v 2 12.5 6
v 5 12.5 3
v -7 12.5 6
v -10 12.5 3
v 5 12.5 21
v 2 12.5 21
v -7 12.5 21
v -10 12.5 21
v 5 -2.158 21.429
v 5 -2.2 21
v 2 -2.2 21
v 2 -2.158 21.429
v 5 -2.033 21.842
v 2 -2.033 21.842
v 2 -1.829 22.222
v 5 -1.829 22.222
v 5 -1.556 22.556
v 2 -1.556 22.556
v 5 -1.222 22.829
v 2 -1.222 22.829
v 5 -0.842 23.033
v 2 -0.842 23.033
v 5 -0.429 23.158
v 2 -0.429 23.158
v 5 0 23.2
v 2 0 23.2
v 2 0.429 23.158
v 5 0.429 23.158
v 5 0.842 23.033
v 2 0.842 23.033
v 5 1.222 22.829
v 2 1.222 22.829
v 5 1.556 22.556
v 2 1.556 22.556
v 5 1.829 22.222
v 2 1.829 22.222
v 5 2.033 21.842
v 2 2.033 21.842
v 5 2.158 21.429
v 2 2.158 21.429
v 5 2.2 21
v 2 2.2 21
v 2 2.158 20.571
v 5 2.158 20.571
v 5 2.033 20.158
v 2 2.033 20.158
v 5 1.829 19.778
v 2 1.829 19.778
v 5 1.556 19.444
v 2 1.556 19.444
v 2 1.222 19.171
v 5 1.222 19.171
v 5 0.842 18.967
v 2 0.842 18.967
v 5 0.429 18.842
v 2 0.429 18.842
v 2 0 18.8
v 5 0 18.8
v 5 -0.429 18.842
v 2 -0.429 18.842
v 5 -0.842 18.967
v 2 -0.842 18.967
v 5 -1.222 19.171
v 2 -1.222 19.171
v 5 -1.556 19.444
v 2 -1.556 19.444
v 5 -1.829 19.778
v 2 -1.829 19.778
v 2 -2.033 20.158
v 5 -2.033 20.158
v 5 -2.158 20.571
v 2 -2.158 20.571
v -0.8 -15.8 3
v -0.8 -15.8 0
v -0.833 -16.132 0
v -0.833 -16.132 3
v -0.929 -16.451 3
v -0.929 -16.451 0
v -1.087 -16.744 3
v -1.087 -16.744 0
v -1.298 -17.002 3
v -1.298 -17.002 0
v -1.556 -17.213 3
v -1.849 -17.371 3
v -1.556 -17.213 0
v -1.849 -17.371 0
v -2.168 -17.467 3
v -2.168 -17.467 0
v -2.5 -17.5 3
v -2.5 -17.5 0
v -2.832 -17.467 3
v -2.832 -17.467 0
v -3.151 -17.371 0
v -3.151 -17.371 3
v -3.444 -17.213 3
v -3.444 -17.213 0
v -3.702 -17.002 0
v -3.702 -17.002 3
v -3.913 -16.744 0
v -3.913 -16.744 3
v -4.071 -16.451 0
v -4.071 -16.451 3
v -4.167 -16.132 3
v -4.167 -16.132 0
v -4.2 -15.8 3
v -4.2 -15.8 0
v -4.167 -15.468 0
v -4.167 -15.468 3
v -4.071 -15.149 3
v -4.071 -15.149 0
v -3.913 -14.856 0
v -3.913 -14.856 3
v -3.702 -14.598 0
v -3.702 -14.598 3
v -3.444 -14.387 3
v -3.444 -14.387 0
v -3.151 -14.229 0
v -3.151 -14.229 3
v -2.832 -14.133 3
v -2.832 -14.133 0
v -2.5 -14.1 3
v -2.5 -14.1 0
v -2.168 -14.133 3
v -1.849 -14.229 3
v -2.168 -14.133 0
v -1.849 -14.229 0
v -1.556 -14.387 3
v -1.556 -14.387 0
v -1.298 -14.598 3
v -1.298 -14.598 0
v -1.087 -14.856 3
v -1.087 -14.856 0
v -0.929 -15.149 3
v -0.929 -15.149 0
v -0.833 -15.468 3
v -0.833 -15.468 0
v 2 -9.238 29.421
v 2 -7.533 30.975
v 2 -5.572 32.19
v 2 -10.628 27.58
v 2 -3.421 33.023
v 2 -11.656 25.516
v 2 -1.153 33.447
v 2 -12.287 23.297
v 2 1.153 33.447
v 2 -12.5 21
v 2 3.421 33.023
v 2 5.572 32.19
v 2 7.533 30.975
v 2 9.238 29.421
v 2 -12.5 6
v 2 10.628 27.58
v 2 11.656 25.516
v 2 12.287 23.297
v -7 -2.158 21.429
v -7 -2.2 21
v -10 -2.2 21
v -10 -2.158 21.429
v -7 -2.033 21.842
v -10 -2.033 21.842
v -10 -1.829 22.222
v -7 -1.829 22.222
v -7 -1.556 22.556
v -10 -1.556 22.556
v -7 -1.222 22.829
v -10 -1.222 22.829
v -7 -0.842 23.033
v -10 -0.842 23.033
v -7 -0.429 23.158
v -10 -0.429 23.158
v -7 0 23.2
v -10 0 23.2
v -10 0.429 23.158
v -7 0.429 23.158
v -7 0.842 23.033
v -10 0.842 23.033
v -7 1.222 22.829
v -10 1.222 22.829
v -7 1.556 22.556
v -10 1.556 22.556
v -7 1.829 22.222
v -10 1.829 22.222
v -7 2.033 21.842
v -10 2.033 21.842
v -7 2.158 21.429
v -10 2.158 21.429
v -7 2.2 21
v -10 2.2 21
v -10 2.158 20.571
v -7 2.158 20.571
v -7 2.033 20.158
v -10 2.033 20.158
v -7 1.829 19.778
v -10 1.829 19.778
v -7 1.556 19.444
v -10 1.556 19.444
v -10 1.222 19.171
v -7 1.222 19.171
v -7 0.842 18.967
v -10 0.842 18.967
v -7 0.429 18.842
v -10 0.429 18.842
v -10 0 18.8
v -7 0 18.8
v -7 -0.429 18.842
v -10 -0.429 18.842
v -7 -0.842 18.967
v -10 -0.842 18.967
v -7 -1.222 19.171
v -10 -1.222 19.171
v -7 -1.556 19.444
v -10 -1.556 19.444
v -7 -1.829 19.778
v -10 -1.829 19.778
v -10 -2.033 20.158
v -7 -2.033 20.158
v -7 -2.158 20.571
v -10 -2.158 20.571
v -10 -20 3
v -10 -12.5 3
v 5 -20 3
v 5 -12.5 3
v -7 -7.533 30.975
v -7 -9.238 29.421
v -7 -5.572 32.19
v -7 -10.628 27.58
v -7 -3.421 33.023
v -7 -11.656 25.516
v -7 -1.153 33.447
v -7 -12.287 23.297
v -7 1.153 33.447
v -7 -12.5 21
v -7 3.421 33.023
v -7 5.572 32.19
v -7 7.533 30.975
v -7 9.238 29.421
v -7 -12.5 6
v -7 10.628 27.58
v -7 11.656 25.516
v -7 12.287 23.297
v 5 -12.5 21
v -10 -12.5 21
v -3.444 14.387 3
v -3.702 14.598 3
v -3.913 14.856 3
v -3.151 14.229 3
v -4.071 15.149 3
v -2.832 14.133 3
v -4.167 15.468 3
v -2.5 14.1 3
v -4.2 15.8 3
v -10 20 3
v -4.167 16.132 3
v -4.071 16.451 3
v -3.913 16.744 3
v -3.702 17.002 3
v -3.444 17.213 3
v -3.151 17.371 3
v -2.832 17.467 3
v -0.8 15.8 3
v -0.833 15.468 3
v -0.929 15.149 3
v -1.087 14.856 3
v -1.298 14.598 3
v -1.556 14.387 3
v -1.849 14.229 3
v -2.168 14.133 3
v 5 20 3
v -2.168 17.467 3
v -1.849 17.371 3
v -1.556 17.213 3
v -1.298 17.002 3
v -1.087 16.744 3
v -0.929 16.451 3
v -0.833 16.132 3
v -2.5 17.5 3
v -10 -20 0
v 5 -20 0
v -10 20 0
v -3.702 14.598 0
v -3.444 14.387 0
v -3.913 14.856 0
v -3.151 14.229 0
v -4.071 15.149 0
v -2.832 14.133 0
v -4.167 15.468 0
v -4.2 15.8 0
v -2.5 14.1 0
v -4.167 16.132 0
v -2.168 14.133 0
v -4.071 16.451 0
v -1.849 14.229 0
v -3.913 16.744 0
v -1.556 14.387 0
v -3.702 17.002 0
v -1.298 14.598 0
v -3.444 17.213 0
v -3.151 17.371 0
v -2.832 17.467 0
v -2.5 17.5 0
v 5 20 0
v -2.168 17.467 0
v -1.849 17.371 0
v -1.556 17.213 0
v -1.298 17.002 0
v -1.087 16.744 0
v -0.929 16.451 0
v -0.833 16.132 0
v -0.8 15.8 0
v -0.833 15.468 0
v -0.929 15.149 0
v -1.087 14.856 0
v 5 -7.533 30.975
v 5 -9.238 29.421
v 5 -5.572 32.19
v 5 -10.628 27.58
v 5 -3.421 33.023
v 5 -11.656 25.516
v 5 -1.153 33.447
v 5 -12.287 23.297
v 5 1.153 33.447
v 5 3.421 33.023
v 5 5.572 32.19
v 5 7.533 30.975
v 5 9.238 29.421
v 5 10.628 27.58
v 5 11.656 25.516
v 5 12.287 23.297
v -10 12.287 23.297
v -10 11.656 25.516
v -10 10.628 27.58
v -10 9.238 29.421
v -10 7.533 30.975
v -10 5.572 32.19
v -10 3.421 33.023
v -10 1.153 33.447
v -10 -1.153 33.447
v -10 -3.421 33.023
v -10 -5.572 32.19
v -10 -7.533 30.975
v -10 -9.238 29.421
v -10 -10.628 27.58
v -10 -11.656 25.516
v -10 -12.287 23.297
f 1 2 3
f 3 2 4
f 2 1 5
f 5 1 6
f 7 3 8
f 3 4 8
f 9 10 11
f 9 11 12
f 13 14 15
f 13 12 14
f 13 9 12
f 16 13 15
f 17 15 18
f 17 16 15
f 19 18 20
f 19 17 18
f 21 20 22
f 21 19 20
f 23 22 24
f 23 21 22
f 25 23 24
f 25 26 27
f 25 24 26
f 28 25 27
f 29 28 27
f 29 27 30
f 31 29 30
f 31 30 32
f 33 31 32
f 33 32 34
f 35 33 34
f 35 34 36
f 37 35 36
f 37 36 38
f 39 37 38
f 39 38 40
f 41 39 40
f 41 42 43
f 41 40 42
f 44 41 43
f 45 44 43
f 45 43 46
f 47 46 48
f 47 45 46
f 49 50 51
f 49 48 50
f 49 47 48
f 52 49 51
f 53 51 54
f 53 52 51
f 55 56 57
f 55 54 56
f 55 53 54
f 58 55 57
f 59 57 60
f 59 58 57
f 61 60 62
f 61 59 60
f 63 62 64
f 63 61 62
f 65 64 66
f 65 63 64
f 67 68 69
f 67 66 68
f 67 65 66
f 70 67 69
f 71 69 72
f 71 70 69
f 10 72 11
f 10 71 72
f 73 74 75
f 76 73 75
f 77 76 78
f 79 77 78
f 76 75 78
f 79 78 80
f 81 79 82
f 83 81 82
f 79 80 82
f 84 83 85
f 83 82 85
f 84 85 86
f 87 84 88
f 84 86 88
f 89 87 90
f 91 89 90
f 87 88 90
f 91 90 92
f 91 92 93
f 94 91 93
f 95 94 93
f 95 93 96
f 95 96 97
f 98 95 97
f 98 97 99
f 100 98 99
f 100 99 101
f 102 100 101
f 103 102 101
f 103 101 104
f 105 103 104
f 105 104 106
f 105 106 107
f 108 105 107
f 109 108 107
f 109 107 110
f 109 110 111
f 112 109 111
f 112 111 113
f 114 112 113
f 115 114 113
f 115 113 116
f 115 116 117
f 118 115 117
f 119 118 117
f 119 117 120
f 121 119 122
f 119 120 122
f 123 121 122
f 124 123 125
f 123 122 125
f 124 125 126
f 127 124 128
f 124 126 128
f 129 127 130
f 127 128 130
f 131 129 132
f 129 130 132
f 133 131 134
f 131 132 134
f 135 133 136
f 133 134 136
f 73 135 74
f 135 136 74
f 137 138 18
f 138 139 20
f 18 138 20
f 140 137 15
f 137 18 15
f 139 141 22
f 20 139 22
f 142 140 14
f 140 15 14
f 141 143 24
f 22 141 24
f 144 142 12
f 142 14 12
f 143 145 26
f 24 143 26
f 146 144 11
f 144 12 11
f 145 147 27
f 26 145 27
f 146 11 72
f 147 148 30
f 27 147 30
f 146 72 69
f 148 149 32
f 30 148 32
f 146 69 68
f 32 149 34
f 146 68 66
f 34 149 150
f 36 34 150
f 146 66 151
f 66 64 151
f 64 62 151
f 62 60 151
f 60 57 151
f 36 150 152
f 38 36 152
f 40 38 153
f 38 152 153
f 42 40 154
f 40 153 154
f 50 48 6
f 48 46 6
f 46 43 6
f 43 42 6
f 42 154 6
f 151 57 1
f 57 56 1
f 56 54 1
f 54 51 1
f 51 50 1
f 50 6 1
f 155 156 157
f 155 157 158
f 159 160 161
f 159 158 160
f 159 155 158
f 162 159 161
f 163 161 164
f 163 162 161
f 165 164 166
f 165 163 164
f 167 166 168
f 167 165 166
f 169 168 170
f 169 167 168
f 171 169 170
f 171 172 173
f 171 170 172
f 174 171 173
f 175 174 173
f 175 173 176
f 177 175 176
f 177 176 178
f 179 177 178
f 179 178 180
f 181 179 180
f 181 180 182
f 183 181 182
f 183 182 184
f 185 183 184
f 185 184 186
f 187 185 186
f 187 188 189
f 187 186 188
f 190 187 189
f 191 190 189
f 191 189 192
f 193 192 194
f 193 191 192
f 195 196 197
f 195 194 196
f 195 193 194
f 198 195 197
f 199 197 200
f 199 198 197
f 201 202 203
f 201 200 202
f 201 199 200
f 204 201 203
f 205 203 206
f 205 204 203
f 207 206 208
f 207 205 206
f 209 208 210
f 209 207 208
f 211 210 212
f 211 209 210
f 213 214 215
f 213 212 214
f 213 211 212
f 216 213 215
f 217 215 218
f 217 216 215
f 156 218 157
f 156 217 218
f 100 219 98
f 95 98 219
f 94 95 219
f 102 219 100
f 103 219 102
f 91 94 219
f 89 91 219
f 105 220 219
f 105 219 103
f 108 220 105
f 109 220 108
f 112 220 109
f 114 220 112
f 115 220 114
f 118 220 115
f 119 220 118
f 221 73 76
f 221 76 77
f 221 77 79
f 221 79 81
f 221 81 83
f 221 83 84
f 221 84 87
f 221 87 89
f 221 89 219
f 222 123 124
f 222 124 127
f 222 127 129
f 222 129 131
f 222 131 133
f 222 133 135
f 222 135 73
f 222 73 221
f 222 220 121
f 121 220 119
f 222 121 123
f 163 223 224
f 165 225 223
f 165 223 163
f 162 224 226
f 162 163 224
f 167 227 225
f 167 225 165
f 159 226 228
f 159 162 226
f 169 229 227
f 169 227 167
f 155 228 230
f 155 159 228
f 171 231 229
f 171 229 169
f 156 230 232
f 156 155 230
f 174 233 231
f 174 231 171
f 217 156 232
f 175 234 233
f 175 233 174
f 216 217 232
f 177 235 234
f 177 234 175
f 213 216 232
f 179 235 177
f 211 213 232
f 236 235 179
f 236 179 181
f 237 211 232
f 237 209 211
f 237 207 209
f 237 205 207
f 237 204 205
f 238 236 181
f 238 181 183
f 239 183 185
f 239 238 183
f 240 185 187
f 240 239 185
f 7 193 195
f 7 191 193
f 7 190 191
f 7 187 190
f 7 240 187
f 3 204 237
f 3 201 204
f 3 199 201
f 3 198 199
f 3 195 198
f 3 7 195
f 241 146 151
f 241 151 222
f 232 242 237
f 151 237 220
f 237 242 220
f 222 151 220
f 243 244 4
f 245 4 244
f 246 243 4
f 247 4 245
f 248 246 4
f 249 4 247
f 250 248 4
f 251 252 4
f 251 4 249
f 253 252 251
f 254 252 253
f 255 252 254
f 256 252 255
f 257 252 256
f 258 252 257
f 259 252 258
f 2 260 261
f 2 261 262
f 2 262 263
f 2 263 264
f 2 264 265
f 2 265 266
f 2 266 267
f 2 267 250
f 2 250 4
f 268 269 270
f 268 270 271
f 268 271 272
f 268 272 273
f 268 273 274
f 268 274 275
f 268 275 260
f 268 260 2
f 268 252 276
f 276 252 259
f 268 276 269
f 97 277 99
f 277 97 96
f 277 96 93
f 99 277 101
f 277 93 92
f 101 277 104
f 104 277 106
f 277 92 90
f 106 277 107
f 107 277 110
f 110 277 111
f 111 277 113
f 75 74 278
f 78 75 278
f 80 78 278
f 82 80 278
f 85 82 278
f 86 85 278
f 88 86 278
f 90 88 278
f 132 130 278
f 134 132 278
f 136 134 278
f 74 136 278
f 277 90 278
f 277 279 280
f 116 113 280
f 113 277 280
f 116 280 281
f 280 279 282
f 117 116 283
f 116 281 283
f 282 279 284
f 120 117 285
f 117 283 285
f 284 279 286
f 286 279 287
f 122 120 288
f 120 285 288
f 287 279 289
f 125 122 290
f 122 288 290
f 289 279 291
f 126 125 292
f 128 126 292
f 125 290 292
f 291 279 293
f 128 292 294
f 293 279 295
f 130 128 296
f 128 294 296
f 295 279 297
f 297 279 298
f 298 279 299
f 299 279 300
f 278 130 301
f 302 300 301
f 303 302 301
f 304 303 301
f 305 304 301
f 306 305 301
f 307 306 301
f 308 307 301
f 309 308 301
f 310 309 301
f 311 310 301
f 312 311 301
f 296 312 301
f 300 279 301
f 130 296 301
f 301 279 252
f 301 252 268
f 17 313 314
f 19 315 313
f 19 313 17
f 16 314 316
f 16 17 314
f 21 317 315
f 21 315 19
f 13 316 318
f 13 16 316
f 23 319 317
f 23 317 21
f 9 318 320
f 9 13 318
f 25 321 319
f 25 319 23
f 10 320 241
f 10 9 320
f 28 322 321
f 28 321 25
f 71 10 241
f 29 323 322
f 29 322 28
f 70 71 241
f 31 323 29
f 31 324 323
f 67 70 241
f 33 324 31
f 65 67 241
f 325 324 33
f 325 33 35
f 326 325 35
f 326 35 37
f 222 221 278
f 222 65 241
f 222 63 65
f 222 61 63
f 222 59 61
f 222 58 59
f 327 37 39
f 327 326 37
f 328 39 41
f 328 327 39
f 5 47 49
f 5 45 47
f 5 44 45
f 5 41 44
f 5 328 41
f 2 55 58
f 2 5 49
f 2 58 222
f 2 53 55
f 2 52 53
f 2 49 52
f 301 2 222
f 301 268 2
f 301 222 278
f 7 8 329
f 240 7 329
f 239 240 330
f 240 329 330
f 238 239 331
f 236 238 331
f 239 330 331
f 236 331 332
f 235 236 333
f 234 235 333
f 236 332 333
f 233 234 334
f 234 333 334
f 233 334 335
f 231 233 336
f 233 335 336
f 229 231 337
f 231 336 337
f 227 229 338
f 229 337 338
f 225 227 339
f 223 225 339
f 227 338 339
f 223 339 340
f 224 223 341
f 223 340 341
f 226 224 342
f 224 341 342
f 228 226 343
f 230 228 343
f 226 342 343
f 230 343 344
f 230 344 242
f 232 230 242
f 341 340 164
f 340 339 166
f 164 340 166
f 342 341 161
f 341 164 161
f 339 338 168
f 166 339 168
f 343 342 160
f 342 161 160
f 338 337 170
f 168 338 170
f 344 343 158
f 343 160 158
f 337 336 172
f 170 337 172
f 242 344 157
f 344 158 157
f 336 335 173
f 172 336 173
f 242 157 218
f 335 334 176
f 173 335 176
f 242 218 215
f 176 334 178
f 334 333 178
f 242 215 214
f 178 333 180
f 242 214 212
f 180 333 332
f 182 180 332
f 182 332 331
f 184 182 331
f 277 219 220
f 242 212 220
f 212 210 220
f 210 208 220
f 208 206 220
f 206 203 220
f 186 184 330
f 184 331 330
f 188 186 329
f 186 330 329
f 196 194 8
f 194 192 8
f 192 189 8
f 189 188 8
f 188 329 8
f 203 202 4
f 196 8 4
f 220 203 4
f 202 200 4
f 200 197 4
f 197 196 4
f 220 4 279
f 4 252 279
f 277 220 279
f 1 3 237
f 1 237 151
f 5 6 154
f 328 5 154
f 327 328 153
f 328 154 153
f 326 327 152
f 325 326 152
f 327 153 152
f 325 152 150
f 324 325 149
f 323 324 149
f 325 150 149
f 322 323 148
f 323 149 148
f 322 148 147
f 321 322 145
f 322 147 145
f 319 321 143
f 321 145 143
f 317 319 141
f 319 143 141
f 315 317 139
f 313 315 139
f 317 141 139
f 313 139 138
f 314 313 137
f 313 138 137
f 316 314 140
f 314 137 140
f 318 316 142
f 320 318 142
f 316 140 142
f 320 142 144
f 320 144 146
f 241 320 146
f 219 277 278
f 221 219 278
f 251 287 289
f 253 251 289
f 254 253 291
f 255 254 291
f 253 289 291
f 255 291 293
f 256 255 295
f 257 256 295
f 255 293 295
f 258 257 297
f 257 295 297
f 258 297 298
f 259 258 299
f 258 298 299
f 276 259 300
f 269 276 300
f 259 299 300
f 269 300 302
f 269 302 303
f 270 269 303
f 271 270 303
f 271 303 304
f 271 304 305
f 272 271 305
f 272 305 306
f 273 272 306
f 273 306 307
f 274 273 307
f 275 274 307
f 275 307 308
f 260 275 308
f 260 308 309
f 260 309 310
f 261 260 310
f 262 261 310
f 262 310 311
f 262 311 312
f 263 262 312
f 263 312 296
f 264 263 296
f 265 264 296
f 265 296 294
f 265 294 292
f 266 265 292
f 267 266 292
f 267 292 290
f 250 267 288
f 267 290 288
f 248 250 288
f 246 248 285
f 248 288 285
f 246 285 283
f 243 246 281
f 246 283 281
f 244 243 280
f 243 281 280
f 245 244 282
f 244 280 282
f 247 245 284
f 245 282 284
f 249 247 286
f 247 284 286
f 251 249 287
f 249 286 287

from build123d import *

# Parameters (mm, degrees)
SCHIZZO1_W                    = 15
SCHIZZO1_H                    = 40
ESTRUSIONE_ESTRUSIONE1_DEPTH  = 3
SCHIZZO2_W                    = 15
SCHIZZO2_H                    = 25
ESTRUSIONE_ESTRUSIONE2_DEPTH  = 3
ESTRUSIONE_ESTRUSIONE4_DEPTH  = 3
ESTRUSIONE_ESTRUSIONE5_START  = -3
ESTRUSIONE_ESTRUSIONE5_DEPTH  = 3
TAGLIO_ESTRUSIONE1_DEPTH      = 42.800119617
TAGLIO_ESTRUSIONE1_DEPTH_BACK = 42.800119617
SCHIZZO7_R                    = 2.2
SCHIZZO9_R                    = 1.7
TAGLIO_ESTRUSIONE2_DEPTH      = 7


with BuildPart() as part:
    # Schizzo1 → Estrusione-Estrusione1 (new body)
    with BuildSketch(Plane.XY):
        with Locations((-2.5, 0)):
            Rectangle(SCHIZZO1_W, SCHIZZO1_H)
    extrude(amount=ESTRUSIONE_ESTRUSIONE1_DEPTH)

    # Schizzo2 → Estrusione-Estrusione2 (add)
    with BuildSketch(Plane.XY.offset(3)):
        with Locations((-2.5, 0)):
            Rectangle(SCHIZZO2_W, SCHIZZO2_H)
    extrude(amount=ESTRUSIONE_ESTRUSIONE2_DEPTH)

    # Schizzo5 → Estrusione-Estrusione4 (add)
    with BuildSketch(Plane.ZY.offset(10)):
        with BuildLine():
            Line((6, 12.5), (21, 12.5))
            ThreePointArc((21, 12.5), (33.5, 0), (21, -12.5))
            Line((21, -12.5), (6, -12.5))
            Line((6, -12.5), (6, 12.5))
        make_face()
    extrude(amount=-ESTRUSIONE_ESTRUSIONE4_DEPTH)

    # Schizzo6 → Estrusione-Estrusione5 (add)
    with BuildSketch(Plane(origin=(5, 0, 0), x_dir=(0, 0, -1), z_dir=(1, 0, 0)).offset(ESTRUSIONE_ESTRUSIONE5_START)):
        with BuildLine():
            Line((-6, -12.5), (-6, 12.5))
            Line((-6, 12.5), (-21, 12.5))
            ThreePointArc((-21, 12.5), (-33.5, 0), (-21, -12.5))
            Line((-21, -12.5), (-6, -12.5))
        make_face()
    extrude(amount=ESTRUSIONE_ESTRUSIONE5_DEPTH)

    # Schizzo7 → Taglio-Estrusione1 (cut, two sides: drawn at the far end of the back side and taken through both)
    with BuildSketch(Plane.ZY.offset(10).offset(-TAGLIO_ESTRUSIONE1_DEPTH_BACK)):
        with Locations(Location((21, 0, 0), (0, 0, 270))):
            Circle(SCHIZZO7_R)
    extrude(amount=TAGLIO_ESTRUSIONE1_DEPTH + TAGLIO_ESTRUSIONE1_DEPTH_BACK, mode=Mode.SUBTRACT)

    # Schizzo9 → Taglio-Estrusione2 (cut)
    with BuildSketch(Plane(origin=(0, 0, 0), x_dir=(-1, 0, 0), z_dir=(0, 0, -1))):
        with Locations((2.5, 15.8)):
            Circle(SCHIZZO9_R)
        with Locations(Location((2.5, -15.8, 0), (0, 0, 180))):
            Circle(SCHIZZO9_R)
    extrude(amount=-TAGLIO_ESTRUSIONE2_DEPTH, mode=Mode.SUBTRACT)


solid = part.part
